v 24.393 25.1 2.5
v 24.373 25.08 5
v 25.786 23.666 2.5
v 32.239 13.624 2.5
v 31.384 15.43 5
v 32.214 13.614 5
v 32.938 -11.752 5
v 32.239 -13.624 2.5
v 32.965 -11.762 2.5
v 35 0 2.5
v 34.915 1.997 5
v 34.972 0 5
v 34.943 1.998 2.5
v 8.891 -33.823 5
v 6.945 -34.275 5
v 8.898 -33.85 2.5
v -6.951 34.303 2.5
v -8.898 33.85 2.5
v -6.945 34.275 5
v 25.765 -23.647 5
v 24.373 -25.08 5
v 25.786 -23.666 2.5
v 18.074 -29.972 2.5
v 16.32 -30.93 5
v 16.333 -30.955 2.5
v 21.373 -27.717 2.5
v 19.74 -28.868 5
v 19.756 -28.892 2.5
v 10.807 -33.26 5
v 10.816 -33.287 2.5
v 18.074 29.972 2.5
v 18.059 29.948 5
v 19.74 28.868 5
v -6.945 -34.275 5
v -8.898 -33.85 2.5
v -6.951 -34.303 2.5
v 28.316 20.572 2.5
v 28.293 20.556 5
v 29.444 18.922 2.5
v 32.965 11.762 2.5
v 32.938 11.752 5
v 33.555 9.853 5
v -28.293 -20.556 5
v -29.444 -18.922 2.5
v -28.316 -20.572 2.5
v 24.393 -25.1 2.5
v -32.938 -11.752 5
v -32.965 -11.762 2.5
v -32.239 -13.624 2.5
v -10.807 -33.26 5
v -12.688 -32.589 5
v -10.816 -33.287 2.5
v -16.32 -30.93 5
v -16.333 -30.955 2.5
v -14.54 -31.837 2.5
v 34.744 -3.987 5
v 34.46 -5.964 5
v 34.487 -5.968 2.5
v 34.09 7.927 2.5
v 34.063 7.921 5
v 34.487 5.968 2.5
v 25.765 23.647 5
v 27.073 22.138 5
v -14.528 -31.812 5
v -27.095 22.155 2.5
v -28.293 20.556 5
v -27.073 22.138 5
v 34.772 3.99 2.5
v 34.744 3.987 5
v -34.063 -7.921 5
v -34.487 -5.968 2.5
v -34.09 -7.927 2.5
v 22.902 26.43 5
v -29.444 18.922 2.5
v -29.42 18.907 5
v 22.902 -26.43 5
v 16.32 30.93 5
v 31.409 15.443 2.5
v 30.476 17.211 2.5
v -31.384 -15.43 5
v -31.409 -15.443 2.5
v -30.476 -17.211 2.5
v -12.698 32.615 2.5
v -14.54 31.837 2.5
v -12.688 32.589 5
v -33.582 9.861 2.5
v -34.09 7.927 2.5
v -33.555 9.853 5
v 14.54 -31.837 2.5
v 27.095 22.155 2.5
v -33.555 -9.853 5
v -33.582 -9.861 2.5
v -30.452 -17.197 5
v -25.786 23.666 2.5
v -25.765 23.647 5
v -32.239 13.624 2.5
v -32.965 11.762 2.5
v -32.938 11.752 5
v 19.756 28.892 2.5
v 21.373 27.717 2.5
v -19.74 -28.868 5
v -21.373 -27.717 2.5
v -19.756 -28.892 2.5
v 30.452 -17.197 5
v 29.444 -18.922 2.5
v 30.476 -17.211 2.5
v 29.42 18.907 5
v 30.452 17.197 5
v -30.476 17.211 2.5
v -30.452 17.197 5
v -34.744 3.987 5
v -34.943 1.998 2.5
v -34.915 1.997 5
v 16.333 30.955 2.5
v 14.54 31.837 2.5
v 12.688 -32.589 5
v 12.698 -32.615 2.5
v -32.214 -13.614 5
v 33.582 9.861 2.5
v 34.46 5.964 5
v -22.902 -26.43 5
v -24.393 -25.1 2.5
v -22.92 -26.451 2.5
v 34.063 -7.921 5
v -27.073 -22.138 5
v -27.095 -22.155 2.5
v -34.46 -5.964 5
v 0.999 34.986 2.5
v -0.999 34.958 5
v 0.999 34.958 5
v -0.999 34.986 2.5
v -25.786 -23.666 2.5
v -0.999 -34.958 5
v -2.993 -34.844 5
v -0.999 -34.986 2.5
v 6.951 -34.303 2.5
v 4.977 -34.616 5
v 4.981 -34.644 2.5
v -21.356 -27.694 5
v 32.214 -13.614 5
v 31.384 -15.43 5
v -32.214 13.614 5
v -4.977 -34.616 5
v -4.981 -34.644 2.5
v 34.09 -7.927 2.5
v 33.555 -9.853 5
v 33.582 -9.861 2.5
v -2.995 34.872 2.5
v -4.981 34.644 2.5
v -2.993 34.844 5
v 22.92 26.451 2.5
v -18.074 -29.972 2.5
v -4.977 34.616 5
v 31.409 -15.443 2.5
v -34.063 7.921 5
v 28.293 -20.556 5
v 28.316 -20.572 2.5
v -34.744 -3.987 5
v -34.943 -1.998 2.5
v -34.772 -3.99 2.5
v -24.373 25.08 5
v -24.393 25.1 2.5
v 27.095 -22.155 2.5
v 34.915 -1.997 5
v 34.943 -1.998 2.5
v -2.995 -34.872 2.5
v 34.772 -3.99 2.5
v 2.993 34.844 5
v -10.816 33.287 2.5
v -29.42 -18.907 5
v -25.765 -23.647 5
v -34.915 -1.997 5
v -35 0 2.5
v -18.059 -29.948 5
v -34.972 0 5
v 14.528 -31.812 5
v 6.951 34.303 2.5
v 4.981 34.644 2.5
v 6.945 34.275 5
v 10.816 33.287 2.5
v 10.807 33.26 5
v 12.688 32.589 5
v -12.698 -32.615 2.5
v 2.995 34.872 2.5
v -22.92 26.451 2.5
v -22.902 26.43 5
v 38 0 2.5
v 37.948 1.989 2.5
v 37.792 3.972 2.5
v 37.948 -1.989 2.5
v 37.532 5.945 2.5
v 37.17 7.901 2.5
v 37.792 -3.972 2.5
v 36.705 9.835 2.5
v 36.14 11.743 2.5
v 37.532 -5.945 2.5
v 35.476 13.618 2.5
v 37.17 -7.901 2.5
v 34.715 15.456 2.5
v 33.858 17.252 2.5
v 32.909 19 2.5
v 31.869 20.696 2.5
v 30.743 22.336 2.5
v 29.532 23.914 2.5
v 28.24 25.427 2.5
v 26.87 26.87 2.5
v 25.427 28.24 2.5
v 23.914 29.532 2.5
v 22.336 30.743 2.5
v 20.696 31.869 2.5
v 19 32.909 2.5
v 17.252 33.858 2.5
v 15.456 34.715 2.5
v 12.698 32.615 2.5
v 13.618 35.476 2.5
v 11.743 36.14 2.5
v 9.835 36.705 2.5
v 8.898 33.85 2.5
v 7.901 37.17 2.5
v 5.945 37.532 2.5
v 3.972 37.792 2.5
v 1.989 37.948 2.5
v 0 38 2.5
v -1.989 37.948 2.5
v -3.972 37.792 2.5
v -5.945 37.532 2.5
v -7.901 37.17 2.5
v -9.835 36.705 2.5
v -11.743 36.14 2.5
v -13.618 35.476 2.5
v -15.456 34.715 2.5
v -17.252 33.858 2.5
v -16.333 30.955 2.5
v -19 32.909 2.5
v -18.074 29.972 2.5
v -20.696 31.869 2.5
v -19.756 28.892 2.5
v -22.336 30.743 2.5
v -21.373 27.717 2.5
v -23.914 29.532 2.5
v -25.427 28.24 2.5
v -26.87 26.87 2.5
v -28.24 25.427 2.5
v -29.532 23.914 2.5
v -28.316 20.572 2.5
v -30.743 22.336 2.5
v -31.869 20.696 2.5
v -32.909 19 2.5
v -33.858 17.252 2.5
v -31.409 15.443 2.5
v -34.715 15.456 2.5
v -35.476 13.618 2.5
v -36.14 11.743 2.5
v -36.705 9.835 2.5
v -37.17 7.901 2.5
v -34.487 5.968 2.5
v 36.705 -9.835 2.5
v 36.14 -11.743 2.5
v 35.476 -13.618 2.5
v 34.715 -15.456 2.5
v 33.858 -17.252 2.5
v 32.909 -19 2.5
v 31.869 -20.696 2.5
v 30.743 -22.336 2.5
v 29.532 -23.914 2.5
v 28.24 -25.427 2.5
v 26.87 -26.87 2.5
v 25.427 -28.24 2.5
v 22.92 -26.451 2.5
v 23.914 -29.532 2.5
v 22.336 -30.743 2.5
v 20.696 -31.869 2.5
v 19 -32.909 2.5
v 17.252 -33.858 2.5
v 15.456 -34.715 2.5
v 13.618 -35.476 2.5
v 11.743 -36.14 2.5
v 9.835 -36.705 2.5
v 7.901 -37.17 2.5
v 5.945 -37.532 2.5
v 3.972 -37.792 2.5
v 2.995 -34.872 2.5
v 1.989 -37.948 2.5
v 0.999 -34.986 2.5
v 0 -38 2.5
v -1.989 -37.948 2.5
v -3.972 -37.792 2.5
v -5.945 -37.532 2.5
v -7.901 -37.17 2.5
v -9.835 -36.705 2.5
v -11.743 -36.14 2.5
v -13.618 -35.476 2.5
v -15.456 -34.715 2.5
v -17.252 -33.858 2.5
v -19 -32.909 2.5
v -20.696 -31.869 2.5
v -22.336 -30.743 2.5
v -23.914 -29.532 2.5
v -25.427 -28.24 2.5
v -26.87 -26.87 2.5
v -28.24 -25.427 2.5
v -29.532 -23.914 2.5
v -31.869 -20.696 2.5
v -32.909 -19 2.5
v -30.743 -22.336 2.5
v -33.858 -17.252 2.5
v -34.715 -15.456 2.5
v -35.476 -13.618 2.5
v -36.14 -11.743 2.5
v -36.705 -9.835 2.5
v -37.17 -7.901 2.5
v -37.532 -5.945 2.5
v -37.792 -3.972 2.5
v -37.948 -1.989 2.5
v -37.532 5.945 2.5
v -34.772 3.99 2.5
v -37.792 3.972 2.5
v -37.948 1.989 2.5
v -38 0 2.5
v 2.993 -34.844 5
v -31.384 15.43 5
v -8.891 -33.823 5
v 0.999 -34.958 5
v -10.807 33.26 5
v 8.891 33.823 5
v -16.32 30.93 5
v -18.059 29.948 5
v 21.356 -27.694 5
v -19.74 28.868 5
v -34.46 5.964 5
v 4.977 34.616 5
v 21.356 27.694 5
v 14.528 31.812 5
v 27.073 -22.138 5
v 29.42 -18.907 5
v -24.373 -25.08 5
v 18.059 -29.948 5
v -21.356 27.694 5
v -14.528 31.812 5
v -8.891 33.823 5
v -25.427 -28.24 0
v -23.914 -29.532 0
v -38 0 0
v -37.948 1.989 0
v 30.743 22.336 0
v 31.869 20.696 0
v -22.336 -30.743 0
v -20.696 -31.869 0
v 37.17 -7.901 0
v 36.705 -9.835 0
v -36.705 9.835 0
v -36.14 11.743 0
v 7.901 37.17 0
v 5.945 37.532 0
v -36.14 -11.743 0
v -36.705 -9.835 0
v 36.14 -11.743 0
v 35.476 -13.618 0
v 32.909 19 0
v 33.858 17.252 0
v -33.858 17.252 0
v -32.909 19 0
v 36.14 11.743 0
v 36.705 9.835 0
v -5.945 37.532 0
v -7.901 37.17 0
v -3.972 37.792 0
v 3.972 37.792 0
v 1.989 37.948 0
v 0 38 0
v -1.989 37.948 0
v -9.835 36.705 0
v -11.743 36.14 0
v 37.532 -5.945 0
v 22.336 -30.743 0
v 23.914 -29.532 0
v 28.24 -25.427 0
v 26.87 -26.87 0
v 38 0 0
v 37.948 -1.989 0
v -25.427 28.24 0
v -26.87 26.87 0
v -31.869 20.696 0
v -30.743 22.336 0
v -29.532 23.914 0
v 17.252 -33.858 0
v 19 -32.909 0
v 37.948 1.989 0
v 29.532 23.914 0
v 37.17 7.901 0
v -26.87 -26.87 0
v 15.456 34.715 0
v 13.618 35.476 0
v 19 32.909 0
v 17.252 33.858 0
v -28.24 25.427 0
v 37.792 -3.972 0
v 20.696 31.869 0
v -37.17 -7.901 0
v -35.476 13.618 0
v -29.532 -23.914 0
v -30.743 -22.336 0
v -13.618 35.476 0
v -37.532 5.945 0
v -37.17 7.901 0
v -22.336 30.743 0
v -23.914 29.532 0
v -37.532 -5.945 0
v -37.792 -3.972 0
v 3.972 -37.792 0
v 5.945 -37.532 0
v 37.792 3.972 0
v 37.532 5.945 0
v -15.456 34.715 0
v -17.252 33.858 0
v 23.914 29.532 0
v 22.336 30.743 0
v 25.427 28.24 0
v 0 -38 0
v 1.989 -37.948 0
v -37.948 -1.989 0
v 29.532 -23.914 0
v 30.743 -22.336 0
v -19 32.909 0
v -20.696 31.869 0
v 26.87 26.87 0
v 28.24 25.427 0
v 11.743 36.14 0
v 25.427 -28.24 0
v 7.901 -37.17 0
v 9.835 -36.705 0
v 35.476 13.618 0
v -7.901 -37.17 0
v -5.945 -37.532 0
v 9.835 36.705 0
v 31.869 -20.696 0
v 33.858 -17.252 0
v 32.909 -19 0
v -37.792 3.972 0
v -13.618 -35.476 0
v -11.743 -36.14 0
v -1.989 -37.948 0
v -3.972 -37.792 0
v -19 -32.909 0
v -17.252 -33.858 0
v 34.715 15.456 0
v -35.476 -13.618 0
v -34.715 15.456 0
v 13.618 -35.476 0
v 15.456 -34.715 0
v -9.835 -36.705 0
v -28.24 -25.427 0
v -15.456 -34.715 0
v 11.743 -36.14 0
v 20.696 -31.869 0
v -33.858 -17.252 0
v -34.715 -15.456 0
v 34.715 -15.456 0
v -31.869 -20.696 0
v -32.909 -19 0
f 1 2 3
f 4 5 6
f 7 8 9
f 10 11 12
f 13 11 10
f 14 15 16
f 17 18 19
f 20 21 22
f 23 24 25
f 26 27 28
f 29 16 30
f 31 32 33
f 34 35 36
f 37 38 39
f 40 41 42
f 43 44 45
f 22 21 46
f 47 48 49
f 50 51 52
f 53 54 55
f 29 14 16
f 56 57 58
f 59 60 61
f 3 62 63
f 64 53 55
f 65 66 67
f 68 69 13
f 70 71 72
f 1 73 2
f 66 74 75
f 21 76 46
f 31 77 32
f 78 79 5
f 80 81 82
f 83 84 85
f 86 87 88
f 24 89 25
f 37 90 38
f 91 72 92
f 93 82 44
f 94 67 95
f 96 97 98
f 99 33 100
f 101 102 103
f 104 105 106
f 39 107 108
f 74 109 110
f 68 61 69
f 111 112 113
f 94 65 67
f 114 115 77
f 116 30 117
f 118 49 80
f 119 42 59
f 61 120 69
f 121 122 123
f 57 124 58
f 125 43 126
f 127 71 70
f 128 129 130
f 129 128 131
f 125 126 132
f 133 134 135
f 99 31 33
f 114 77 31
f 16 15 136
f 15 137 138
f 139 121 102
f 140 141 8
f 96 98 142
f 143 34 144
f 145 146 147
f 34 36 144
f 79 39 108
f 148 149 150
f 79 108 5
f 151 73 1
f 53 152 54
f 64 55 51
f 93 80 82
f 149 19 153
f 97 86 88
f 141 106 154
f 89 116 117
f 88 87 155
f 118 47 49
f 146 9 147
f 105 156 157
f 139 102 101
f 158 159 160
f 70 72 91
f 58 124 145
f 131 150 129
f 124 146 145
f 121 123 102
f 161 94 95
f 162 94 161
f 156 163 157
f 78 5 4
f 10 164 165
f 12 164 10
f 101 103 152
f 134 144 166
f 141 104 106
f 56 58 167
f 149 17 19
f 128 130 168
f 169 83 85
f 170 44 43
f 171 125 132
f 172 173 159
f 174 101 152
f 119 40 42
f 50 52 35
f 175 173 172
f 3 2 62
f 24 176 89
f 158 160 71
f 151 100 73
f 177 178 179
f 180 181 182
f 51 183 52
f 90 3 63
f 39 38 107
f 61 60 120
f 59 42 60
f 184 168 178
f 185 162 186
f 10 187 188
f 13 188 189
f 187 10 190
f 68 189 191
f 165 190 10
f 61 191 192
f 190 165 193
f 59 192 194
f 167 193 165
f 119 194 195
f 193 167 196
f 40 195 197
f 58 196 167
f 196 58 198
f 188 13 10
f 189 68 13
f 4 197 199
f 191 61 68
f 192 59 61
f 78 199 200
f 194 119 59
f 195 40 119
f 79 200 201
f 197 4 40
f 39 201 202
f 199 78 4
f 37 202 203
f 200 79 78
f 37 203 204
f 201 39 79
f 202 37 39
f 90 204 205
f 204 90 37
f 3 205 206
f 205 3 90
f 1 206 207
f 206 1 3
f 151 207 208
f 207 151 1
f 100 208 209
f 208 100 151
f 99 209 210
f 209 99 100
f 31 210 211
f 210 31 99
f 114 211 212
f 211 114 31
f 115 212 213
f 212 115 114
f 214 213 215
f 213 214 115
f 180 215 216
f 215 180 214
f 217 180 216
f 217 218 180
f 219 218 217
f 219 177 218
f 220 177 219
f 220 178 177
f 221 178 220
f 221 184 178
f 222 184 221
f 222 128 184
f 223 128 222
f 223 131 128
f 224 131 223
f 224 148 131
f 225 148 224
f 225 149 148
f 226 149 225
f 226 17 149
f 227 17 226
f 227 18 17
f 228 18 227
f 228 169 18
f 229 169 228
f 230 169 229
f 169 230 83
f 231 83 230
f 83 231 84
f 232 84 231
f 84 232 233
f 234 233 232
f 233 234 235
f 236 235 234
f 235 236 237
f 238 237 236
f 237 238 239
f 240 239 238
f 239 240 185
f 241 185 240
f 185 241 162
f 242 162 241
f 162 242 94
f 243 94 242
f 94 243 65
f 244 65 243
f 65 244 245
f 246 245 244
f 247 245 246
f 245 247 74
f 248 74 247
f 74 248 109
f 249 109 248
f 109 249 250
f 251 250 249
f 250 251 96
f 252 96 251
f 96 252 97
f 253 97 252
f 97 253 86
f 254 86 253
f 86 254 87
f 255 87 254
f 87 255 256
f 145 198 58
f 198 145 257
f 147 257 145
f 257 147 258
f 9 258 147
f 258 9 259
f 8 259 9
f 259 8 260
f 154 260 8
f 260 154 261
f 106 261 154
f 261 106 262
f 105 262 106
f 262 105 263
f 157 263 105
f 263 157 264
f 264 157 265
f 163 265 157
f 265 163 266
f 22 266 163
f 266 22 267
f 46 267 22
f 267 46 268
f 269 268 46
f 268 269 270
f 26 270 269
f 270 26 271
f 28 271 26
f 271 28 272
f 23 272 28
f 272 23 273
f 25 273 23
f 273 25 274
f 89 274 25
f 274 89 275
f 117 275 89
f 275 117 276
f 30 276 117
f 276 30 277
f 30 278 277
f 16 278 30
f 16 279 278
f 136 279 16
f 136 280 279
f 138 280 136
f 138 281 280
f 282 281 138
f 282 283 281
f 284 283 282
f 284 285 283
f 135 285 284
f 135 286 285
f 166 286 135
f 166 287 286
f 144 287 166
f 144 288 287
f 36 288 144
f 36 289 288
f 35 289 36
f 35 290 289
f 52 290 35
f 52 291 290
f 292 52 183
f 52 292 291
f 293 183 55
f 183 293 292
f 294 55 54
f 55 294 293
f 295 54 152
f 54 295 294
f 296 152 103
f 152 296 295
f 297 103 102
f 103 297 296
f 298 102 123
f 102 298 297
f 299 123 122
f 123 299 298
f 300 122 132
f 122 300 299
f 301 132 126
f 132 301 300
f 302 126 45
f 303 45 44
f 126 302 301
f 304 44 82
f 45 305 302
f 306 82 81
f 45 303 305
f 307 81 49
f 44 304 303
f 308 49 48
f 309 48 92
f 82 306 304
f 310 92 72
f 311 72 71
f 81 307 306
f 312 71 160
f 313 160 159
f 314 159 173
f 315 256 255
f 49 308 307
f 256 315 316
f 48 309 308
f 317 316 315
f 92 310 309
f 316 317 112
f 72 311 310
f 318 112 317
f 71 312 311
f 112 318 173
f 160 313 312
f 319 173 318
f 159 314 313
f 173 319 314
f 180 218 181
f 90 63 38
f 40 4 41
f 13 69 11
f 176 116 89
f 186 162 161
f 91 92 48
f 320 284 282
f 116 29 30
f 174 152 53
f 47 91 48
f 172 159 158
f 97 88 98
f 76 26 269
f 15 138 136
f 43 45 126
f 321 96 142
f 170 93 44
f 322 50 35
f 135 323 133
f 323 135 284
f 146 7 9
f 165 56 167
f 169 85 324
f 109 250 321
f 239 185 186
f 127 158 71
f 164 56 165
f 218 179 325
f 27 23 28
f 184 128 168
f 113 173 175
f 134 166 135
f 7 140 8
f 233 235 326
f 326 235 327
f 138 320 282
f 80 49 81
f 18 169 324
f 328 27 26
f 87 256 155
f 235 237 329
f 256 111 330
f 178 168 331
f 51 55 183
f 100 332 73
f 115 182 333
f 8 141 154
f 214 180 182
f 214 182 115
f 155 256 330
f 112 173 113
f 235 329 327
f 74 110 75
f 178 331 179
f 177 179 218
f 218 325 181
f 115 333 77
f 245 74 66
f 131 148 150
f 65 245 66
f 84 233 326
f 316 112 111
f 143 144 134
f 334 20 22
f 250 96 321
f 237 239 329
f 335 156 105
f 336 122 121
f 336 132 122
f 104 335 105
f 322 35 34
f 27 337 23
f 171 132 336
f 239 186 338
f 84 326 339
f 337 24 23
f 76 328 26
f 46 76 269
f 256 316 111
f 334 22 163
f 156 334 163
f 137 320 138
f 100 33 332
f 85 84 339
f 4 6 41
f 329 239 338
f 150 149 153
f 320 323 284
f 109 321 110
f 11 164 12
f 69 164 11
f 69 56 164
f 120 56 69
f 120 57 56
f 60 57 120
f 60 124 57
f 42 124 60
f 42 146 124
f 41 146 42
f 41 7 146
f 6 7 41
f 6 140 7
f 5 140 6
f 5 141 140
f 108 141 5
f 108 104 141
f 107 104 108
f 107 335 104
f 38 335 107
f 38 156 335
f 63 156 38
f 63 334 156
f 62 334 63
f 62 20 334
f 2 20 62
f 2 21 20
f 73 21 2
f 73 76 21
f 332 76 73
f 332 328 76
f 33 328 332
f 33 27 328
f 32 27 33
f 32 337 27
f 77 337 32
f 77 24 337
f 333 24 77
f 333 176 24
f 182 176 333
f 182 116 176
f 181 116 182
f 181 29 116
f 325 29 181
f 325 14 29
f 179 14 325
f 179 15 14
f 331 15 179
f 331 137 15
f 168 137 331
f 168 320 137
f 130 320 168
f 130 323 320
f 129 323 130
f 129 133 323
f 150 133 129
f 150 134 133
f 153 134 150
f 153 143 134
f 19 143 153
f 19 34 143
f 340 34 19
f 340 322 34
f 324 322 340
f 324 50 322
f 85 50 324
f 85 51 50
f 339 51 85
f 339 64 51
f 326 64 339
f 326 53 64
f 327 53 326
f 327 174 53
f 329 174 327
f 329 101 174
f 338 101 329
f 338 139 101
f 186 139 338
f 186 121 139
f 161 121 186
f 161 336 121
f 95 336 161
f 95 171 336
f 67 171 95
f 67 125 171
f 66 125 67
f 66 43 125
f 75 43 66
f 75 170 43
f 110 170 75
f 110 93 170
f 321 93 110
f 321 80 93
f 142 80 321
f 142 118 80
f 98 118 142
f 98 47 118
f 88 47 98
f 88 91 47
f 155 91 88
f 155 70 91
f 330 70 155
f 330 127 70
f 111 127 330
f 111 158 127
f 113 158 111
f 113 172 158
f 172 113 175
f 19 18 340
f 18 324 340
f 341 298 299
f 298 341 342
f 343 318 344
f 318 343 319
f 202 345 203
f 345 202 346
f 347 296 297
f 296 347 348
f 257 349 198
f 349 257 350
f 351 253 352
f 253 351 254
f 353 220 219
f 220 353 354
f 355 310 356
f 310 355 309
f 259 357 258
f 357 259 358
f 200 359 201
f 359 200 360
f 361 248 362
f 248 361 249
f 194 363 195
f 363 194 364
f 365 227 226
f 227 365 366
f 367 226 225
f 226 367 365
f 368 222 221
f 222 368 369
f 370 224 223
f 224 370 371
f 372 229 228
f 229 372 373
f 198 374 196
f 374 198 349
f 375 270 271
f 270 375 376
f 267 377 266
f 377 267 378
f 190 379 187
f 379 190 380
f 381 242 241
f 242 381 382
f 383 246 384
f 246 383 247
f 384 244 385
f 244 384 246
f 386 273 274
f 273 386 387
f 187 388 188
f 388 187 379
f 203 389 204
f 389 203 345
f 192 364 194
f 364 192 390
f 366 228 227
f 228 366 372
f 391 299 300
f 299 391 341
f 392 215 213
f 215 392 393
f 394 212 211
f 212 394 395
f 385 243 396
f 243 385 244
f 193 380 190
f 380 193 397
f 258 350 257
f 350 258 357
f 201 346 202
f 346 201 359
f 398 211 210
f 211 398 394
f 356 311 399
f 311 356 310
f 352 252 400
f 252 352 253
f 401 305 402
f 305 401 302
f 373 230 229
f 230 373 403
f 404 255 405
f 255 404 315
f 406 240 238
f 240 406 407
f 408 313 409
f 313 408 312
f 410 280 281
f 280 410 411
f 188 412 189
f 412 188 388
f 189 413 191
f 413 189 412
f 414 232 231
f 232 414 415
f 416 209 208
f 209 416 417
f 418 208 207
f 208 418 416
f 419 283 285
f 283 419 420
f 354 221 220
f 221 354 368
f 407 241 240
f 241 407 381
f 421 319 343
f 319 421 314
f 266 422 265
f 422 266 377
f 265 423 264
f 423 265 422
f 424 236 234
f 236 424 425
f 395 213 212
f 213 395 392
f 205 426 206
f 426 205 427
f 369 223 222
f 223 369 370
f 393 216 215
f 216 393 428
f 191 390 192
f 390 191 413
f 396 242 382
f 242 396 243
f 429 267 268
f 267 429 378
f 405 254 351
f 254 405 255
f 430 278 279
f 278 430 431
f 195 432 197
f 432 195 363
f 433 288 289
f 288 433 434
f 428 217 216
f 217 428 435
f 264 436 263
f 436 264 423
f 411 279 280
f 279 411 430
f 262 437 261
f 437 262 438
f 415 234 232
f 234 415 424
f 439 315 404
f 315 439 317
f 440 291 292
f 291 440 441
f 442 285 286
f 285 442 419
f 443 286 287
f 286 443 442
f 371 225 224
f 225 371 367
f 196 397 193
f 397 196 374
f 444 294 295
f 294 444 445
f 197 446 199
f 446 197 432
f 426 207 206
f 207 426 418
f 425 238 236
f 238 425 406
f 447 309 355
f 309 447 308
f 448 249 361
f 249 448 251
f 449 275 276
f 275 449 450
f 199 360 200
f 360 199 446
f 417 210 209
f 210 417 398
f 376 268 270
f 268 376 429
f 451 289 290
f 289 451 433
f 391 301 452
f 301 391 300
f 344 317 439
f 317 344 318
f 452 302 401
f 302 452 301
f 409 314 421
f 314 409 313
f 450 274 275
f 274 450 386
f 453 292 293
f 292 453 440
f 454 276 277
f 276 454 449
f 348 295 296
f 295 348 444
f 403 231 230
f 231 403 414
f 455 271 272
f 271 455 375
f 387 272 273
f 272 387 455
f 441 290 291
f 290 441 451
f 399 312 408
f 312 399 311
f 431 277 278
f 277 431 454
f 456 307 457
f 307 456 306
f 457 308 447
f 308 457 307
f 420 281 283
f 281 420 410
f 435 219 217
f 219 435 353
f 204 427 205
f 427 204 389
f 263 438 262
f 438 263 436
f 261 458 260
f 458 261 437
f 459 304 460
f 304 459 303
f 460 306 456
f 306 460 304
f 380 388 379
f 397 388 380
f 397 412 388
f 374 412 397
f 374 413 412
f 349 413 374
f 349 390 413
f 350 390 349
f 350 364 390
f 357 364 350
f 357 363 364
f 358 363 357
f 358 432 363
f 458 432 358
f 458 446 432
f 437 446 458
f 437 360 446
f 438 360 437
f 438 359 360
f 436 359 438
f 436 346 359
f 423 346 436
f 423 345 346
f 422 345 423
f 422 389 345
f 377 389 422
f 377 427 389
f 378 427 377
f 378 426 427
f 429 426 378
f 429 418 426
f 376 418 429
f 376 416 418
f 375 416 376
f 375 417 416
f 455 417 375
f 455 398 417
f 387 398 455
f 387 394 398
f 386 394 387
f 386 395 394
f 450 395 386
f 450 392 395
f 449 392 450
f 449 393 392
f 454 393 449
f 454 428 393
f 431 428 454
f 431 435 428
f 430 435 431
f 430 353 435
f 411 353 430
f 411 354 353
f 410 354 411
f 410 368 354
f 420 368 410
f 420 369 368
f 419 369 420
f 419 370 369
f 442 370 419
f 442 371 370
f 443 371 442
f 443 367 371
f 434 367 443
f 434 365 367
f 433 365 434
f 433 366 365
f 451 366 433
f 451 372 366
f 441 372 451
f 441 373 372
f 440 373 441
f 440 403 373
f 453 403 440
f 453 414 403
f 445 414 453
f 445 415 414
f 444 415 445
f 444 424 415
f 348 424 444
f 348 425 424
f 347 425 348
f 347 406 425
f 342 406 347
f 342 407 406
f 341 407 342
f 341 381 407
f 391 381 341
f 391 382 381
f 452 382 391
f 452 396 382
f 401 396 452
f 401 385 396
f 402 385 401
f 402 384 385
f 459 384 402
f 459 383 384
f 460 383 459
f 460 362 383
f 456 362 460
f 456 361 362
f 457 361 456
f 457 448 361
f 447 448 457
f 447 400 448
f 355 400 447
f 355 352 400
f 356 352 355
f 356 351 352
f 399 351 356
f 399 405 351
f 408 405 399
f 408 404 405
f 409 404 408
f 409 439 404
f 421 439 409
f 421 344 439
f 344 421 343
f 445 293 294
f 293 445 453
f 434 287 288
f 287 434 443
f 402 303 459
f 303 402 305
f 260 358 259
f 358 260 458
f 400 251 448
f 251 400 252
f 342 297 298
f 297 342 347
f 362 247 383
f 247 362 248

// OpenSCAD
/*

      |----id----|   
       |-not id-|          |\
    _   ________           | \
   h_ _/        \_ <----- h|  \
   h_|____________|        |   \
                           |____\ <-- theta
     |-----od-----|      h/atan(theta) 
*/
h = 2.5;     // mm 
od = 76;     // mm
id = 70;     // mm
theta = 81;  // degrees
$fa = 1;

module plug() {
    d_large = id;
    d_small = id - (2 * (h / atan(theta)));
    cylinder(h=h, d1=d_large, d2=d_small);
}

module lid() {
    cylinder(h=h, d=od);
}

module cap() {
    translate([0, 0, h]) plug();
    lid();
}

cap();
